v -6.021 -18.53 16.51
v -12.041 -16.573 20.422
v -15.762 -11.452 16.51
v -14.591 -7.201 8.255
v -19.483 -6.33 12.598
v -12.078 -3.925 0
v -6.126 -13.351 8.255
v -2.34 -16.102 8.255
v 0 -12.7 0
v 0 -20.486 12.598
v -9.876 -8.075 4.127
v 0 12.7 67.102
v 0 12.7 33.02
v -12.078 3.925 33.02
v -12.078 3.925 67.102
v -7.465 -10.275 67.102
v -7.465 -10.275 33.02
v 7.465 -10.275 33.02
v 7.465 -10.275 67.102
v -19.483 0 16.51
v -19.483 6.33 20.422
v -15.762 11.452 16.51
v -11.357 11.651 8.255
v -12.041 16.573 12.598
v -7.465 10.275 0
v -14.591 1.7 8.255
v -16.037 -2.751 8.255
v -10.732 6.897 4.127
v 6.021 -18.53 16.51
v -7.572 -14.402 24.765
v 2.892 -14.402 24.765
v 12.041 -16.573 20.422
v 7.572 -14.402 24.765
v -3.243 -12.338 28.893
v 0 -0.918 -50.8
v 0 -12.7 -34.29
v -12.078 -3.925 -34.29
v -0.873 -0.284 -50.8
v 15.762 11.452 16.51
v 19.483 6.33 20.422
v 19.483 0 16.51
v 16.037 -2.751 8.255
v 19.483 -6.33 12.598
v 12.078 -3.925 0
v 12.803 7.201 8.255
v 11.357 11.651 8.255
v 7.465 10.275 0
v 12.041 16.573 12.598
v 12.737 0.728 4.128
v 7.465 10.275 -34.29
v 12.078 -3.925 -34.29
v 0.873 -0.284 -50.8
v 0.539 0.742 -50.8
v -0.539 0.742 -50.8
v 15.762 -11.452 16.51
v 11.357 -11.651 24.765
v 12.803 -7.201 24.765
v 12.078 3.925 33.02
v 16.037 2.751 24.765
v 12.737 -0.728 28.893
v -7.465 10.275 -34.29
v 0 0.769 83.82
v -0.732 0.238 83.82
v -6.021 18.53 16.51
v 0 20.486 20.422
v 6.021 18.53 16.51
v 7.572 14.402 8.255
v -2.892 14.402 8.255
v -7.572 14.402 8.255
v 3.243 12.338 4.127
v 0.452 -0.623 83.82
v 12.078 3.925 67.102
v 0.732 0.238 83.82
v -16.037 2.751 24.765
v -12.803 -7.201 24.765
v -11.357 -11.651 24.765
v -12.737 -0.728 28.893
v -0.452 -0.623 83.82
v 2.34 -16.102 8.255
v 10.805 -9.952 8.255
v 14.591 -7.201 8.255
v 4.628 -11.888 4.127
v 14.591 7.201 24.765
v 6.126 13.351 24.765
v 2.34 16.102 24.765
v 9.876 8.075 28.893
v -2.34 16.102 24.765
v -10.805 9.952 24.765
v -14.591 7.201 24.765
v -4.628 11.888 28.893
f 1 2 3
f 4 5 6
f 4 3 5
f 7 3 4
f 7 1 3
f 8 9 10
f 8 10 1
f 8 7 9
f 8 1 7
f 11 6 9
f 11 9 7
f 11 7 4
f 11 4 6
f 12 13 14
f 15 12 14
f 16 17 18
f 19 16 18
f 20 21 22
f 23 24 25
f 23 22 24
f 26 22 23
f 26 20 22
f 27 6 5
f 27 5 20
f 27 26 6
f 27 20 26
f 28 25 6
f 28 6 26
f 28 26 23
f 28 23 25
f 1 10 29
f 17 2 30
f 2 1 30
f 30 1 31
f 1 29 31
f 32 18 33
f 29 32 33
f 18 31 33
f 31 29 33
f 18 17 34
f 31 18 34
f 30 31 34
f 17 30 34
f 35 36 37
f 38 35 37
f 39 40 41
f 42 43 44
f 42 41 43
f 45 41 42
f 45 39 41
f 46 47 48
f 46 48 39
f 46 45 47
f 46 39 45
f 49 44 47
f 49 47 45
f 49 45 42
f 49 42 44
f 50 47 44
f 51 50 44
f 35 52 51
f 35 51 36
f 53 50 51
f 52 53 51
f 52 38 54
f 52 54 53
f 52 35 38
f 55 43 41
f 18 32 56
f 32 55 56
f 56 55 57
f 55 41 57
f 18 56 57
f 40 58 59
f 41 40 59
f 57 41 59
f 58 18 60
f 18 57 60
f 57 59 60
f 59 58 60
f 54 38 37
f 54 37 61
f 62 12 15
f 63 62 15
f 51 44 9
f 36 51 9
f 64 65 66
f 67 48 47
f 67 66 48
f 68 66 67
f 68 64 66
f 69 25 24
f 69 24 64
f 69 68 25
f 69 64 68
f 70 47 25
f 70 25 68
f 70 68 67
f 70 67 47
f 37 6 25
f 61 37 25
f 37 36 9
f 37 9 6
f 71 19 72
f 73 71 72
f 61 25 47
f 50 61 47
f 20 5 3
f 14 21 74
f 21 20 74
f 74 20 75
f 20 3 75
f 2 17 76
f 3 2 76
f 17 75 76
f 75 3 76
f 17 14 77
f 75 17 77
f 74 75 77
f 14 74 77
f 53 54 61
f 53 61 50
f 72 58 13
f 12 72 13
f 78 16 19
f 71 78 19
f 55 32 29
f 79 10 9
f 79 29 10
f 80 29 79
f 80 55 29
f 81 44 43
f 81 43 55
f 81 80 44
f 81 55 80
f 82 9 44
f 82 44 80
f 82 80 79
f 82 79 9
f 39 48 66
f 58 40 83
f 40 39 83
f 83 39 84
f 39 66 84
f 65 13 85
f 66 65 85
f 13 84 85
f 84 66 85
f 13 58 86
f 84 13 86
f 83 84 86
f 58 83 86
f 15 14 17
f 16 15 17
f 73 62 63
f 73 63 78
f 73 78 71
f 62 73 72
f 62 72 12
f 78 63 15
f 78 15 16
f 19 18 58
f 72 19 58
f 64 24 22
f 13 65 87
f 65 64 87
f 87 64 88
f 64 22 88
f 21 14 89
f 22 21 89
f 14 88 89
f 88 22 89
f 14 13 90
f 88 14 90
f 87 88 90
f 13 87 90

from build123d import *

# Parameters (mm, degrees)
F1_DEPTH = 33.02
F1_TAPER = -26.56505118
F3_DEPTH = 33.02
F3_TAPER = -26.56505118
F5_DEPTH = 50.8
F6_SIZE2 = 16.7177543947
F6_SIZE  = 9.652
F8_DEPTH = 50.8
F9_SIZE2 = 16.51
F9_SIZE  = 9.5320529443


with BuildPart() as f1:
    # F0 (on Top) → F1 (new body)
    with BuildSketch(Plane.XY):
        Polygon((12.0784177569, -3.9245158286), (7.4648727041, 10.2745158286), (-7.4648727041, 10.2745158286), (-12.0784177569, -3.9245158286), (0, -12.7), align=None)
    extrude(amount=F1_DEPTH, taper=F1_TAPER)

    # F2 (on face) → F3 (intersect)
    with BuildSketch(Plane.XY.offset(33.02)):
        Polygon((7.4648727041, -10.2745158286), (12.0784177569, 3.9245158286), (0, 12.7), (-12.0784177569, 3.9245158286), (-7.4648727041, -10.2745158286), align=None)
    extrude(amount=-F3_DEPTH, taper=F3_TAPER, mode=Mode.INTERSECT)

    # F4 (on face) → F5 (join)
    with BuildSketch(Plane.XY.offset(33.02)):
        Polygon((-12.0784177569, 3.9245158286), (-7.4648727041, -10.2745158286), (7.4648727041, -10.2745158286), (12.0784177569, 3.9245158286), (0, 12.7), align=None)
    extrude(amount=F5_DEPTH)

    # F6
    f6_edges = [f1.edges().sort_by_distance(p)[0] for p in [
        (9.771645, -3.175, 83.82),
        (0, -10.274516, 83.82),
        (-9.771645, -3.175, 83.82),
        (-6.039209, 8.312258, 83.82),
        (6.039209, 8.312258, 83.82),
    ]]
    f6_side = f1.faces().sort_by_distance((0, 0, 83.82))[0]
    chamfer(f6_edges, length=F6_SIZE, length2=F6_SIZE2, reference=f6_side)

    # F7 (on face) → F8 (join)
    with BuildSketch(Plane(origin=(0, 0, 0), x_dir=(1, 0, 0), z_dir=(0, 0, -1))):
        Polygon((0, 12.7), (-12.0784177569, 3.9245158286), (-7.4648727041, -10.2745158286), (7.4648727041, -10.2745158286), (12.0784177569, 3.9245158286), align=None)
    extrude(amount=F8_DEPTH)

    # F9
    f9_edges = [f1.edges().sort_by_distance(p)[0] for p in [
        (-9.771645, 3.175, -50.8),
        (0, 10.274516, -50.8),
        (9.771645, 3.175, -50.8),
        (6.039209, -8.312258, -50.8),
        (-6.039209, -8.312258, -50.8),
    ]]
    f9_side = f1.faces().sort_by_distance((0, 0, -50.8))[0]
    chamfer(f9_edges, length=F9_SIZE, length2=F9_SIZE2, reference=f9_side)


solid = f1.part
